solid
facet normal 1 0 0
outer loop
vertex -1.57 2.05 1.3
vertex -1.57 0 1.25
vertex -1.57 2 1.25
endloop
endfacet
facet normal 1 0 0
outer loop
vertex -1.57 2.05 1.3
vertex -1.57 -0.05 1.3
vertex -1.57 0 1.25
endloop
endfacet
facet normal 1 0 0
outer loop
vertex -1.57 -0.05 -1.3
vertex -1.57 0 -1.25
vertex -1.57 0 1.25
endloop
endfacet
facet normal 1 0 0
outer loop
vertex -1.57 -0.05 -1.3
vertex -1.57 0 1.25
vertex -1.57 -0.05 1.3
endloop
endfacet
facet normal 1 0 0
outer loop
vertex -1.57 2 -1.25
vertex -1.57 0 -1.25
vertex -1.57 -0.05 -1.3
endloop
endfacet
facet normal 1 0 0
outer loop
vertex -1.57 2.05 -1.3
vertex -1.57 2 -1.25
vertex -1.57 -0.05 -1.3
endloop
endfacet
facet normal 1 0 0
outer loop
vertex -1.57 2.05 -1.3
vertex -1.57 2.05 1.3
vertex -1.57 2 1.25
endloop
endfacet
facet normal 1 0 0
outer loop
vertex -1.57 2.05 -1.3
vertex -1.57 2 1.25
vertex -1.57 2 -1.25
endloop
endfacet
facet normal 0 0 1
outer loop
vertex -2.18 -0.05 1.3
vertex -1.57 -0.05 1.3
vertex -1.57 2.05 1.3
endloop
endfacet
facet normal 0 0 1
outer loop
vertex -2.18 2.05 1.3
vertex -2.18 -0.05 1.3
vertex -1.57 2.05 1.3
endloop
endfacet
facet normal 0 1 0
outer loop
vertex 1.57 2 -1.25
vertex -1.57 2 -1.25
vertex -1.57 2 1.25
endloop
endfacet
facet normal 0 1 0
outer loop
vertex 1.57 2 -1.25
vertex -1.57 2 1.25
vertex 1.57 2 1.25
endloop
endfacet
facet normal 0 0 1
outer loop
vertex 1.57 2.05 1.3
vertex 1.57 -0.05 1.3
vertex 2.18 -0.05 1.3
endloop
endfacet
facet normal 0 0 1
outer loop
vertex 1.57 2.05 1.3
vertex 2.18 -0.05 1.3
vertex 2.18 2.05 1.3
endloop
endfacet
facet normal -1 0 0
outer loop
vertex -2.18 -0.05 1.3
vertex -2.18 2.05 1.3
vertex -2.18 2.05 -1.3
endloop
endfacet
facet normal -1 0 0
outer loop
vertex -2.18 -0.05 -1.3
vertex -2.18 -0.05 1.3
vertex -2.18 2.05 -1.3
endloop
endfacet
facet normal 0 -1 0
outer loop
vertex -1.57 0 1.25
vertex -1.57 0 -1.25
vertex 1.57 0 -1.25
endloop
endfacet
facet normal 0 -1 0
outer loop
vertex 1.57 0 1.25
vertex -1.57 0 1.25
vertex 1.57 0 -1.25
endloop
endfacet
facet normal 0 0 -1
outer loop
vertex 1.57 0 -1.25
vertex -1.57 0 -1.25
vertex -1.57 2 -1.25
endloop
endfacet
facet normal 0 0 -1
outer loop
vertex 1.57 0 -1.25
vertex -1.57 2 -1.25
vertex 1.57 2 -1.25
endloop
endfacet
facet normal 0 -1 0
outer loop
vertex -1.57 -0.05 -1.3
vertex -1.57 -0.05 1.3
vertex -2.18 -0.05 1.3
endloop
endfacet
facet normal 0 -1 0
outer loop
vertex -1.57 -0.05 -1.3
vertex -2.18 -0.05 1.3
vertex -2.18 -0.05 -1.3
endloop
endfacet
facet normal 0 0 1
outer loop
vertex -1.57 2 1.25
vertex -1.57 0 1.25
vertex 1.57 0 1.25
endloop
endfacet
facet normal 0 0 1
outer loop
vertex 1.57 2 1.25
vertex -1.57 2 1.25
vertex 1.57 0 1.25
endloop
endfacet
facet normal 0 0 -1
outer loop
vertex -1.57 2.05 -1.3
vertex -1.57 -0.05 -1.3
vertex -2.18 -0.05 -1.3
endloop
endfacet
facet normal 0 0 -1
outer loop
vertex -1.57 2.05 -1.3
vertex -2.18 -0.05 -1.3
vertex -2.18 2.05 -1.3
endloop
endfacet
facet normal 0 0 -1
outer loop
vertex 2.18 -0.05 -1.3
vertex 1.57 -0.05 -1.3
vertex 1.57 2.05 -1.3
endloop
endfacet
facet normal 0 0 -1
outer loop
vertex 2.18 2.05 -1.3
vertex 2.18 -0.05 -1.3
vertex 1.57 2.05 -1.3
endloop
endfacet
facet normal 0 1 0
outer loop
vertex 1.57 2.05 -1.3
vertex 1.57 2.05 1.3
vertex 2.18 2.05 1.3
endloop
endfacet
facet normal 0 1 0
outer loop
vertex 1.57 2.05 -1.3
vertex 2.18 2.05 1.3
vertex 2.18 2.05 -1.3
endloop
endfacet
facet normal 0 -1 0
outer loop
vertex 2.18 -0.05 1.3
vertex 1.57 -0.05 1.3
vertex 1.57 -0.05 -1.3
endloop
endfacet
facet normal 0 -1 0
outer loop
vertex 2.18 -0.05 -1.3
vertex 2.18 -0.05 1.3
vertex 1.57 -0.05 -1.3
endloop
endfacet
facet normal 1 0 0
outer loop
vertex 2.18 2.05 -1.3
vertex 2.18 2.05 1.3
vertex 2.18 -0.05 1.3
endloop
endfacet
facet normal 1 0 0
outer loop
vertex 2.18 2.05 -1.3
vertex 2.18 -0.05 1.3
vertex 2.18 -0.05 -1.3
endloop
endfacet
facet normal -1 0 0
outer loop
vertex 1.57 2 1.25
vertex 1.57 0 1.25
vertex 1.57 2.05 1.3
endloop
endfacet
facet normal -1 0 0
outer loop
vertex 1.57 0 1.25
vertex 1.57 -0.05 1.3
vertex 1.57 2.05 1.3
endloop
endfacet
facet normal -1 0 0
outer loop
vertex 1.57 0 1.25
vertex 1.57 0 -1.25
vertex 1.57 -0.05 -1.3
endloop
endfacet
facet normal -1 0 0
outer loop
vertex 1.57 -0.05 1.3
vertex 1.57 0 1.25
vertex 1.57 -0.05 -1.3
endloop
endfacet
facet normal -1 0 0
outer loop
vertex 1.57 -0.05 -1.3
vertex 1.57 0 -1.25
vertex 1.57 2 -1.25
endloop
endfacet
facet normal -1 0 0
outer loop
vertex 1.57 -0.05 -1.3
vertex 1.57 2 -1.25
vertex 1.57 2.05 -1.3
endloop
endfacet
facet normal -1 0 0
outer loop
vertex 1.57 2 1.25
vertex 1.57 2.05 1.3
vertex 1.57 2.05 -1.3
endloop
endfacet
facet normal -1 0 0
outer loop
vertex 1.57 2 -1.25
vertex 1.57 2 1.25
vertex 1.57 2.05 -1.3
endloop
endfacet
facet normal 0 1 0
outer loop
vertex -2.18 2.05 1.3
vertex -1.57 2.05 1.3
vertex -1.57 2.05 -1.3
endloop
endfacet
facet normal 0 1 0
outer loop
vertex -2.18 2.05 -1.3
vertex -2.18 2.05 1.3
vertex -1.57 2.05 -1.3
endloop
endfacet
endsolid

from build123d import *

# Parameters (mm, degrees)
SKETCH1_W           = 3.2
SKETCH1_H           = 2.5
BOSS_EXTRUDE1_DEPTH = 2
BOSS_EXTRUDE2_START = -0.03
SKETCH2_W           = 2.6
SKETCH2_H           = 2.1
BOSS_EXTRUDE2_DEPTH = 0.61


with BuildPart() as part:
    # Sketch1 → Boss-Extrude1 (new body)
    with BuildSketch(Plane(origin=(0, 0, 0), x_dir=(1, 0, 0), z_dir=(0, 1, 0))):
        Rectangle(SKETCH1_W, SKETCH1_H)
    extrude(amount=BOSS_EXTRUDE1_DEPTH)

    # Sketch2 → Boss-Extrude2 (add)
    with BuildSketch(Plane(origin=(1.6, 0, 0), x_dir=(0, 0, -1), z_dir=(1, 0, 0)).offset(BOSS_EXTRUDE2_START)):
        with Locations((0, 1)):
            Rectangle(SKETCH2_W, SKETCH2_H)
    boss_extrude2 = extrude(amount=BOSS_EXTRUDE2_DEPTH)

    # Mirror1: Boss-Extrude2 across plane
    add(boss_extrude2.mirror(Plane(origin=(0, 0, 0), x_dir=(0, 0, 1), z_dir=(1, 0, 0))))


solid = part.part
